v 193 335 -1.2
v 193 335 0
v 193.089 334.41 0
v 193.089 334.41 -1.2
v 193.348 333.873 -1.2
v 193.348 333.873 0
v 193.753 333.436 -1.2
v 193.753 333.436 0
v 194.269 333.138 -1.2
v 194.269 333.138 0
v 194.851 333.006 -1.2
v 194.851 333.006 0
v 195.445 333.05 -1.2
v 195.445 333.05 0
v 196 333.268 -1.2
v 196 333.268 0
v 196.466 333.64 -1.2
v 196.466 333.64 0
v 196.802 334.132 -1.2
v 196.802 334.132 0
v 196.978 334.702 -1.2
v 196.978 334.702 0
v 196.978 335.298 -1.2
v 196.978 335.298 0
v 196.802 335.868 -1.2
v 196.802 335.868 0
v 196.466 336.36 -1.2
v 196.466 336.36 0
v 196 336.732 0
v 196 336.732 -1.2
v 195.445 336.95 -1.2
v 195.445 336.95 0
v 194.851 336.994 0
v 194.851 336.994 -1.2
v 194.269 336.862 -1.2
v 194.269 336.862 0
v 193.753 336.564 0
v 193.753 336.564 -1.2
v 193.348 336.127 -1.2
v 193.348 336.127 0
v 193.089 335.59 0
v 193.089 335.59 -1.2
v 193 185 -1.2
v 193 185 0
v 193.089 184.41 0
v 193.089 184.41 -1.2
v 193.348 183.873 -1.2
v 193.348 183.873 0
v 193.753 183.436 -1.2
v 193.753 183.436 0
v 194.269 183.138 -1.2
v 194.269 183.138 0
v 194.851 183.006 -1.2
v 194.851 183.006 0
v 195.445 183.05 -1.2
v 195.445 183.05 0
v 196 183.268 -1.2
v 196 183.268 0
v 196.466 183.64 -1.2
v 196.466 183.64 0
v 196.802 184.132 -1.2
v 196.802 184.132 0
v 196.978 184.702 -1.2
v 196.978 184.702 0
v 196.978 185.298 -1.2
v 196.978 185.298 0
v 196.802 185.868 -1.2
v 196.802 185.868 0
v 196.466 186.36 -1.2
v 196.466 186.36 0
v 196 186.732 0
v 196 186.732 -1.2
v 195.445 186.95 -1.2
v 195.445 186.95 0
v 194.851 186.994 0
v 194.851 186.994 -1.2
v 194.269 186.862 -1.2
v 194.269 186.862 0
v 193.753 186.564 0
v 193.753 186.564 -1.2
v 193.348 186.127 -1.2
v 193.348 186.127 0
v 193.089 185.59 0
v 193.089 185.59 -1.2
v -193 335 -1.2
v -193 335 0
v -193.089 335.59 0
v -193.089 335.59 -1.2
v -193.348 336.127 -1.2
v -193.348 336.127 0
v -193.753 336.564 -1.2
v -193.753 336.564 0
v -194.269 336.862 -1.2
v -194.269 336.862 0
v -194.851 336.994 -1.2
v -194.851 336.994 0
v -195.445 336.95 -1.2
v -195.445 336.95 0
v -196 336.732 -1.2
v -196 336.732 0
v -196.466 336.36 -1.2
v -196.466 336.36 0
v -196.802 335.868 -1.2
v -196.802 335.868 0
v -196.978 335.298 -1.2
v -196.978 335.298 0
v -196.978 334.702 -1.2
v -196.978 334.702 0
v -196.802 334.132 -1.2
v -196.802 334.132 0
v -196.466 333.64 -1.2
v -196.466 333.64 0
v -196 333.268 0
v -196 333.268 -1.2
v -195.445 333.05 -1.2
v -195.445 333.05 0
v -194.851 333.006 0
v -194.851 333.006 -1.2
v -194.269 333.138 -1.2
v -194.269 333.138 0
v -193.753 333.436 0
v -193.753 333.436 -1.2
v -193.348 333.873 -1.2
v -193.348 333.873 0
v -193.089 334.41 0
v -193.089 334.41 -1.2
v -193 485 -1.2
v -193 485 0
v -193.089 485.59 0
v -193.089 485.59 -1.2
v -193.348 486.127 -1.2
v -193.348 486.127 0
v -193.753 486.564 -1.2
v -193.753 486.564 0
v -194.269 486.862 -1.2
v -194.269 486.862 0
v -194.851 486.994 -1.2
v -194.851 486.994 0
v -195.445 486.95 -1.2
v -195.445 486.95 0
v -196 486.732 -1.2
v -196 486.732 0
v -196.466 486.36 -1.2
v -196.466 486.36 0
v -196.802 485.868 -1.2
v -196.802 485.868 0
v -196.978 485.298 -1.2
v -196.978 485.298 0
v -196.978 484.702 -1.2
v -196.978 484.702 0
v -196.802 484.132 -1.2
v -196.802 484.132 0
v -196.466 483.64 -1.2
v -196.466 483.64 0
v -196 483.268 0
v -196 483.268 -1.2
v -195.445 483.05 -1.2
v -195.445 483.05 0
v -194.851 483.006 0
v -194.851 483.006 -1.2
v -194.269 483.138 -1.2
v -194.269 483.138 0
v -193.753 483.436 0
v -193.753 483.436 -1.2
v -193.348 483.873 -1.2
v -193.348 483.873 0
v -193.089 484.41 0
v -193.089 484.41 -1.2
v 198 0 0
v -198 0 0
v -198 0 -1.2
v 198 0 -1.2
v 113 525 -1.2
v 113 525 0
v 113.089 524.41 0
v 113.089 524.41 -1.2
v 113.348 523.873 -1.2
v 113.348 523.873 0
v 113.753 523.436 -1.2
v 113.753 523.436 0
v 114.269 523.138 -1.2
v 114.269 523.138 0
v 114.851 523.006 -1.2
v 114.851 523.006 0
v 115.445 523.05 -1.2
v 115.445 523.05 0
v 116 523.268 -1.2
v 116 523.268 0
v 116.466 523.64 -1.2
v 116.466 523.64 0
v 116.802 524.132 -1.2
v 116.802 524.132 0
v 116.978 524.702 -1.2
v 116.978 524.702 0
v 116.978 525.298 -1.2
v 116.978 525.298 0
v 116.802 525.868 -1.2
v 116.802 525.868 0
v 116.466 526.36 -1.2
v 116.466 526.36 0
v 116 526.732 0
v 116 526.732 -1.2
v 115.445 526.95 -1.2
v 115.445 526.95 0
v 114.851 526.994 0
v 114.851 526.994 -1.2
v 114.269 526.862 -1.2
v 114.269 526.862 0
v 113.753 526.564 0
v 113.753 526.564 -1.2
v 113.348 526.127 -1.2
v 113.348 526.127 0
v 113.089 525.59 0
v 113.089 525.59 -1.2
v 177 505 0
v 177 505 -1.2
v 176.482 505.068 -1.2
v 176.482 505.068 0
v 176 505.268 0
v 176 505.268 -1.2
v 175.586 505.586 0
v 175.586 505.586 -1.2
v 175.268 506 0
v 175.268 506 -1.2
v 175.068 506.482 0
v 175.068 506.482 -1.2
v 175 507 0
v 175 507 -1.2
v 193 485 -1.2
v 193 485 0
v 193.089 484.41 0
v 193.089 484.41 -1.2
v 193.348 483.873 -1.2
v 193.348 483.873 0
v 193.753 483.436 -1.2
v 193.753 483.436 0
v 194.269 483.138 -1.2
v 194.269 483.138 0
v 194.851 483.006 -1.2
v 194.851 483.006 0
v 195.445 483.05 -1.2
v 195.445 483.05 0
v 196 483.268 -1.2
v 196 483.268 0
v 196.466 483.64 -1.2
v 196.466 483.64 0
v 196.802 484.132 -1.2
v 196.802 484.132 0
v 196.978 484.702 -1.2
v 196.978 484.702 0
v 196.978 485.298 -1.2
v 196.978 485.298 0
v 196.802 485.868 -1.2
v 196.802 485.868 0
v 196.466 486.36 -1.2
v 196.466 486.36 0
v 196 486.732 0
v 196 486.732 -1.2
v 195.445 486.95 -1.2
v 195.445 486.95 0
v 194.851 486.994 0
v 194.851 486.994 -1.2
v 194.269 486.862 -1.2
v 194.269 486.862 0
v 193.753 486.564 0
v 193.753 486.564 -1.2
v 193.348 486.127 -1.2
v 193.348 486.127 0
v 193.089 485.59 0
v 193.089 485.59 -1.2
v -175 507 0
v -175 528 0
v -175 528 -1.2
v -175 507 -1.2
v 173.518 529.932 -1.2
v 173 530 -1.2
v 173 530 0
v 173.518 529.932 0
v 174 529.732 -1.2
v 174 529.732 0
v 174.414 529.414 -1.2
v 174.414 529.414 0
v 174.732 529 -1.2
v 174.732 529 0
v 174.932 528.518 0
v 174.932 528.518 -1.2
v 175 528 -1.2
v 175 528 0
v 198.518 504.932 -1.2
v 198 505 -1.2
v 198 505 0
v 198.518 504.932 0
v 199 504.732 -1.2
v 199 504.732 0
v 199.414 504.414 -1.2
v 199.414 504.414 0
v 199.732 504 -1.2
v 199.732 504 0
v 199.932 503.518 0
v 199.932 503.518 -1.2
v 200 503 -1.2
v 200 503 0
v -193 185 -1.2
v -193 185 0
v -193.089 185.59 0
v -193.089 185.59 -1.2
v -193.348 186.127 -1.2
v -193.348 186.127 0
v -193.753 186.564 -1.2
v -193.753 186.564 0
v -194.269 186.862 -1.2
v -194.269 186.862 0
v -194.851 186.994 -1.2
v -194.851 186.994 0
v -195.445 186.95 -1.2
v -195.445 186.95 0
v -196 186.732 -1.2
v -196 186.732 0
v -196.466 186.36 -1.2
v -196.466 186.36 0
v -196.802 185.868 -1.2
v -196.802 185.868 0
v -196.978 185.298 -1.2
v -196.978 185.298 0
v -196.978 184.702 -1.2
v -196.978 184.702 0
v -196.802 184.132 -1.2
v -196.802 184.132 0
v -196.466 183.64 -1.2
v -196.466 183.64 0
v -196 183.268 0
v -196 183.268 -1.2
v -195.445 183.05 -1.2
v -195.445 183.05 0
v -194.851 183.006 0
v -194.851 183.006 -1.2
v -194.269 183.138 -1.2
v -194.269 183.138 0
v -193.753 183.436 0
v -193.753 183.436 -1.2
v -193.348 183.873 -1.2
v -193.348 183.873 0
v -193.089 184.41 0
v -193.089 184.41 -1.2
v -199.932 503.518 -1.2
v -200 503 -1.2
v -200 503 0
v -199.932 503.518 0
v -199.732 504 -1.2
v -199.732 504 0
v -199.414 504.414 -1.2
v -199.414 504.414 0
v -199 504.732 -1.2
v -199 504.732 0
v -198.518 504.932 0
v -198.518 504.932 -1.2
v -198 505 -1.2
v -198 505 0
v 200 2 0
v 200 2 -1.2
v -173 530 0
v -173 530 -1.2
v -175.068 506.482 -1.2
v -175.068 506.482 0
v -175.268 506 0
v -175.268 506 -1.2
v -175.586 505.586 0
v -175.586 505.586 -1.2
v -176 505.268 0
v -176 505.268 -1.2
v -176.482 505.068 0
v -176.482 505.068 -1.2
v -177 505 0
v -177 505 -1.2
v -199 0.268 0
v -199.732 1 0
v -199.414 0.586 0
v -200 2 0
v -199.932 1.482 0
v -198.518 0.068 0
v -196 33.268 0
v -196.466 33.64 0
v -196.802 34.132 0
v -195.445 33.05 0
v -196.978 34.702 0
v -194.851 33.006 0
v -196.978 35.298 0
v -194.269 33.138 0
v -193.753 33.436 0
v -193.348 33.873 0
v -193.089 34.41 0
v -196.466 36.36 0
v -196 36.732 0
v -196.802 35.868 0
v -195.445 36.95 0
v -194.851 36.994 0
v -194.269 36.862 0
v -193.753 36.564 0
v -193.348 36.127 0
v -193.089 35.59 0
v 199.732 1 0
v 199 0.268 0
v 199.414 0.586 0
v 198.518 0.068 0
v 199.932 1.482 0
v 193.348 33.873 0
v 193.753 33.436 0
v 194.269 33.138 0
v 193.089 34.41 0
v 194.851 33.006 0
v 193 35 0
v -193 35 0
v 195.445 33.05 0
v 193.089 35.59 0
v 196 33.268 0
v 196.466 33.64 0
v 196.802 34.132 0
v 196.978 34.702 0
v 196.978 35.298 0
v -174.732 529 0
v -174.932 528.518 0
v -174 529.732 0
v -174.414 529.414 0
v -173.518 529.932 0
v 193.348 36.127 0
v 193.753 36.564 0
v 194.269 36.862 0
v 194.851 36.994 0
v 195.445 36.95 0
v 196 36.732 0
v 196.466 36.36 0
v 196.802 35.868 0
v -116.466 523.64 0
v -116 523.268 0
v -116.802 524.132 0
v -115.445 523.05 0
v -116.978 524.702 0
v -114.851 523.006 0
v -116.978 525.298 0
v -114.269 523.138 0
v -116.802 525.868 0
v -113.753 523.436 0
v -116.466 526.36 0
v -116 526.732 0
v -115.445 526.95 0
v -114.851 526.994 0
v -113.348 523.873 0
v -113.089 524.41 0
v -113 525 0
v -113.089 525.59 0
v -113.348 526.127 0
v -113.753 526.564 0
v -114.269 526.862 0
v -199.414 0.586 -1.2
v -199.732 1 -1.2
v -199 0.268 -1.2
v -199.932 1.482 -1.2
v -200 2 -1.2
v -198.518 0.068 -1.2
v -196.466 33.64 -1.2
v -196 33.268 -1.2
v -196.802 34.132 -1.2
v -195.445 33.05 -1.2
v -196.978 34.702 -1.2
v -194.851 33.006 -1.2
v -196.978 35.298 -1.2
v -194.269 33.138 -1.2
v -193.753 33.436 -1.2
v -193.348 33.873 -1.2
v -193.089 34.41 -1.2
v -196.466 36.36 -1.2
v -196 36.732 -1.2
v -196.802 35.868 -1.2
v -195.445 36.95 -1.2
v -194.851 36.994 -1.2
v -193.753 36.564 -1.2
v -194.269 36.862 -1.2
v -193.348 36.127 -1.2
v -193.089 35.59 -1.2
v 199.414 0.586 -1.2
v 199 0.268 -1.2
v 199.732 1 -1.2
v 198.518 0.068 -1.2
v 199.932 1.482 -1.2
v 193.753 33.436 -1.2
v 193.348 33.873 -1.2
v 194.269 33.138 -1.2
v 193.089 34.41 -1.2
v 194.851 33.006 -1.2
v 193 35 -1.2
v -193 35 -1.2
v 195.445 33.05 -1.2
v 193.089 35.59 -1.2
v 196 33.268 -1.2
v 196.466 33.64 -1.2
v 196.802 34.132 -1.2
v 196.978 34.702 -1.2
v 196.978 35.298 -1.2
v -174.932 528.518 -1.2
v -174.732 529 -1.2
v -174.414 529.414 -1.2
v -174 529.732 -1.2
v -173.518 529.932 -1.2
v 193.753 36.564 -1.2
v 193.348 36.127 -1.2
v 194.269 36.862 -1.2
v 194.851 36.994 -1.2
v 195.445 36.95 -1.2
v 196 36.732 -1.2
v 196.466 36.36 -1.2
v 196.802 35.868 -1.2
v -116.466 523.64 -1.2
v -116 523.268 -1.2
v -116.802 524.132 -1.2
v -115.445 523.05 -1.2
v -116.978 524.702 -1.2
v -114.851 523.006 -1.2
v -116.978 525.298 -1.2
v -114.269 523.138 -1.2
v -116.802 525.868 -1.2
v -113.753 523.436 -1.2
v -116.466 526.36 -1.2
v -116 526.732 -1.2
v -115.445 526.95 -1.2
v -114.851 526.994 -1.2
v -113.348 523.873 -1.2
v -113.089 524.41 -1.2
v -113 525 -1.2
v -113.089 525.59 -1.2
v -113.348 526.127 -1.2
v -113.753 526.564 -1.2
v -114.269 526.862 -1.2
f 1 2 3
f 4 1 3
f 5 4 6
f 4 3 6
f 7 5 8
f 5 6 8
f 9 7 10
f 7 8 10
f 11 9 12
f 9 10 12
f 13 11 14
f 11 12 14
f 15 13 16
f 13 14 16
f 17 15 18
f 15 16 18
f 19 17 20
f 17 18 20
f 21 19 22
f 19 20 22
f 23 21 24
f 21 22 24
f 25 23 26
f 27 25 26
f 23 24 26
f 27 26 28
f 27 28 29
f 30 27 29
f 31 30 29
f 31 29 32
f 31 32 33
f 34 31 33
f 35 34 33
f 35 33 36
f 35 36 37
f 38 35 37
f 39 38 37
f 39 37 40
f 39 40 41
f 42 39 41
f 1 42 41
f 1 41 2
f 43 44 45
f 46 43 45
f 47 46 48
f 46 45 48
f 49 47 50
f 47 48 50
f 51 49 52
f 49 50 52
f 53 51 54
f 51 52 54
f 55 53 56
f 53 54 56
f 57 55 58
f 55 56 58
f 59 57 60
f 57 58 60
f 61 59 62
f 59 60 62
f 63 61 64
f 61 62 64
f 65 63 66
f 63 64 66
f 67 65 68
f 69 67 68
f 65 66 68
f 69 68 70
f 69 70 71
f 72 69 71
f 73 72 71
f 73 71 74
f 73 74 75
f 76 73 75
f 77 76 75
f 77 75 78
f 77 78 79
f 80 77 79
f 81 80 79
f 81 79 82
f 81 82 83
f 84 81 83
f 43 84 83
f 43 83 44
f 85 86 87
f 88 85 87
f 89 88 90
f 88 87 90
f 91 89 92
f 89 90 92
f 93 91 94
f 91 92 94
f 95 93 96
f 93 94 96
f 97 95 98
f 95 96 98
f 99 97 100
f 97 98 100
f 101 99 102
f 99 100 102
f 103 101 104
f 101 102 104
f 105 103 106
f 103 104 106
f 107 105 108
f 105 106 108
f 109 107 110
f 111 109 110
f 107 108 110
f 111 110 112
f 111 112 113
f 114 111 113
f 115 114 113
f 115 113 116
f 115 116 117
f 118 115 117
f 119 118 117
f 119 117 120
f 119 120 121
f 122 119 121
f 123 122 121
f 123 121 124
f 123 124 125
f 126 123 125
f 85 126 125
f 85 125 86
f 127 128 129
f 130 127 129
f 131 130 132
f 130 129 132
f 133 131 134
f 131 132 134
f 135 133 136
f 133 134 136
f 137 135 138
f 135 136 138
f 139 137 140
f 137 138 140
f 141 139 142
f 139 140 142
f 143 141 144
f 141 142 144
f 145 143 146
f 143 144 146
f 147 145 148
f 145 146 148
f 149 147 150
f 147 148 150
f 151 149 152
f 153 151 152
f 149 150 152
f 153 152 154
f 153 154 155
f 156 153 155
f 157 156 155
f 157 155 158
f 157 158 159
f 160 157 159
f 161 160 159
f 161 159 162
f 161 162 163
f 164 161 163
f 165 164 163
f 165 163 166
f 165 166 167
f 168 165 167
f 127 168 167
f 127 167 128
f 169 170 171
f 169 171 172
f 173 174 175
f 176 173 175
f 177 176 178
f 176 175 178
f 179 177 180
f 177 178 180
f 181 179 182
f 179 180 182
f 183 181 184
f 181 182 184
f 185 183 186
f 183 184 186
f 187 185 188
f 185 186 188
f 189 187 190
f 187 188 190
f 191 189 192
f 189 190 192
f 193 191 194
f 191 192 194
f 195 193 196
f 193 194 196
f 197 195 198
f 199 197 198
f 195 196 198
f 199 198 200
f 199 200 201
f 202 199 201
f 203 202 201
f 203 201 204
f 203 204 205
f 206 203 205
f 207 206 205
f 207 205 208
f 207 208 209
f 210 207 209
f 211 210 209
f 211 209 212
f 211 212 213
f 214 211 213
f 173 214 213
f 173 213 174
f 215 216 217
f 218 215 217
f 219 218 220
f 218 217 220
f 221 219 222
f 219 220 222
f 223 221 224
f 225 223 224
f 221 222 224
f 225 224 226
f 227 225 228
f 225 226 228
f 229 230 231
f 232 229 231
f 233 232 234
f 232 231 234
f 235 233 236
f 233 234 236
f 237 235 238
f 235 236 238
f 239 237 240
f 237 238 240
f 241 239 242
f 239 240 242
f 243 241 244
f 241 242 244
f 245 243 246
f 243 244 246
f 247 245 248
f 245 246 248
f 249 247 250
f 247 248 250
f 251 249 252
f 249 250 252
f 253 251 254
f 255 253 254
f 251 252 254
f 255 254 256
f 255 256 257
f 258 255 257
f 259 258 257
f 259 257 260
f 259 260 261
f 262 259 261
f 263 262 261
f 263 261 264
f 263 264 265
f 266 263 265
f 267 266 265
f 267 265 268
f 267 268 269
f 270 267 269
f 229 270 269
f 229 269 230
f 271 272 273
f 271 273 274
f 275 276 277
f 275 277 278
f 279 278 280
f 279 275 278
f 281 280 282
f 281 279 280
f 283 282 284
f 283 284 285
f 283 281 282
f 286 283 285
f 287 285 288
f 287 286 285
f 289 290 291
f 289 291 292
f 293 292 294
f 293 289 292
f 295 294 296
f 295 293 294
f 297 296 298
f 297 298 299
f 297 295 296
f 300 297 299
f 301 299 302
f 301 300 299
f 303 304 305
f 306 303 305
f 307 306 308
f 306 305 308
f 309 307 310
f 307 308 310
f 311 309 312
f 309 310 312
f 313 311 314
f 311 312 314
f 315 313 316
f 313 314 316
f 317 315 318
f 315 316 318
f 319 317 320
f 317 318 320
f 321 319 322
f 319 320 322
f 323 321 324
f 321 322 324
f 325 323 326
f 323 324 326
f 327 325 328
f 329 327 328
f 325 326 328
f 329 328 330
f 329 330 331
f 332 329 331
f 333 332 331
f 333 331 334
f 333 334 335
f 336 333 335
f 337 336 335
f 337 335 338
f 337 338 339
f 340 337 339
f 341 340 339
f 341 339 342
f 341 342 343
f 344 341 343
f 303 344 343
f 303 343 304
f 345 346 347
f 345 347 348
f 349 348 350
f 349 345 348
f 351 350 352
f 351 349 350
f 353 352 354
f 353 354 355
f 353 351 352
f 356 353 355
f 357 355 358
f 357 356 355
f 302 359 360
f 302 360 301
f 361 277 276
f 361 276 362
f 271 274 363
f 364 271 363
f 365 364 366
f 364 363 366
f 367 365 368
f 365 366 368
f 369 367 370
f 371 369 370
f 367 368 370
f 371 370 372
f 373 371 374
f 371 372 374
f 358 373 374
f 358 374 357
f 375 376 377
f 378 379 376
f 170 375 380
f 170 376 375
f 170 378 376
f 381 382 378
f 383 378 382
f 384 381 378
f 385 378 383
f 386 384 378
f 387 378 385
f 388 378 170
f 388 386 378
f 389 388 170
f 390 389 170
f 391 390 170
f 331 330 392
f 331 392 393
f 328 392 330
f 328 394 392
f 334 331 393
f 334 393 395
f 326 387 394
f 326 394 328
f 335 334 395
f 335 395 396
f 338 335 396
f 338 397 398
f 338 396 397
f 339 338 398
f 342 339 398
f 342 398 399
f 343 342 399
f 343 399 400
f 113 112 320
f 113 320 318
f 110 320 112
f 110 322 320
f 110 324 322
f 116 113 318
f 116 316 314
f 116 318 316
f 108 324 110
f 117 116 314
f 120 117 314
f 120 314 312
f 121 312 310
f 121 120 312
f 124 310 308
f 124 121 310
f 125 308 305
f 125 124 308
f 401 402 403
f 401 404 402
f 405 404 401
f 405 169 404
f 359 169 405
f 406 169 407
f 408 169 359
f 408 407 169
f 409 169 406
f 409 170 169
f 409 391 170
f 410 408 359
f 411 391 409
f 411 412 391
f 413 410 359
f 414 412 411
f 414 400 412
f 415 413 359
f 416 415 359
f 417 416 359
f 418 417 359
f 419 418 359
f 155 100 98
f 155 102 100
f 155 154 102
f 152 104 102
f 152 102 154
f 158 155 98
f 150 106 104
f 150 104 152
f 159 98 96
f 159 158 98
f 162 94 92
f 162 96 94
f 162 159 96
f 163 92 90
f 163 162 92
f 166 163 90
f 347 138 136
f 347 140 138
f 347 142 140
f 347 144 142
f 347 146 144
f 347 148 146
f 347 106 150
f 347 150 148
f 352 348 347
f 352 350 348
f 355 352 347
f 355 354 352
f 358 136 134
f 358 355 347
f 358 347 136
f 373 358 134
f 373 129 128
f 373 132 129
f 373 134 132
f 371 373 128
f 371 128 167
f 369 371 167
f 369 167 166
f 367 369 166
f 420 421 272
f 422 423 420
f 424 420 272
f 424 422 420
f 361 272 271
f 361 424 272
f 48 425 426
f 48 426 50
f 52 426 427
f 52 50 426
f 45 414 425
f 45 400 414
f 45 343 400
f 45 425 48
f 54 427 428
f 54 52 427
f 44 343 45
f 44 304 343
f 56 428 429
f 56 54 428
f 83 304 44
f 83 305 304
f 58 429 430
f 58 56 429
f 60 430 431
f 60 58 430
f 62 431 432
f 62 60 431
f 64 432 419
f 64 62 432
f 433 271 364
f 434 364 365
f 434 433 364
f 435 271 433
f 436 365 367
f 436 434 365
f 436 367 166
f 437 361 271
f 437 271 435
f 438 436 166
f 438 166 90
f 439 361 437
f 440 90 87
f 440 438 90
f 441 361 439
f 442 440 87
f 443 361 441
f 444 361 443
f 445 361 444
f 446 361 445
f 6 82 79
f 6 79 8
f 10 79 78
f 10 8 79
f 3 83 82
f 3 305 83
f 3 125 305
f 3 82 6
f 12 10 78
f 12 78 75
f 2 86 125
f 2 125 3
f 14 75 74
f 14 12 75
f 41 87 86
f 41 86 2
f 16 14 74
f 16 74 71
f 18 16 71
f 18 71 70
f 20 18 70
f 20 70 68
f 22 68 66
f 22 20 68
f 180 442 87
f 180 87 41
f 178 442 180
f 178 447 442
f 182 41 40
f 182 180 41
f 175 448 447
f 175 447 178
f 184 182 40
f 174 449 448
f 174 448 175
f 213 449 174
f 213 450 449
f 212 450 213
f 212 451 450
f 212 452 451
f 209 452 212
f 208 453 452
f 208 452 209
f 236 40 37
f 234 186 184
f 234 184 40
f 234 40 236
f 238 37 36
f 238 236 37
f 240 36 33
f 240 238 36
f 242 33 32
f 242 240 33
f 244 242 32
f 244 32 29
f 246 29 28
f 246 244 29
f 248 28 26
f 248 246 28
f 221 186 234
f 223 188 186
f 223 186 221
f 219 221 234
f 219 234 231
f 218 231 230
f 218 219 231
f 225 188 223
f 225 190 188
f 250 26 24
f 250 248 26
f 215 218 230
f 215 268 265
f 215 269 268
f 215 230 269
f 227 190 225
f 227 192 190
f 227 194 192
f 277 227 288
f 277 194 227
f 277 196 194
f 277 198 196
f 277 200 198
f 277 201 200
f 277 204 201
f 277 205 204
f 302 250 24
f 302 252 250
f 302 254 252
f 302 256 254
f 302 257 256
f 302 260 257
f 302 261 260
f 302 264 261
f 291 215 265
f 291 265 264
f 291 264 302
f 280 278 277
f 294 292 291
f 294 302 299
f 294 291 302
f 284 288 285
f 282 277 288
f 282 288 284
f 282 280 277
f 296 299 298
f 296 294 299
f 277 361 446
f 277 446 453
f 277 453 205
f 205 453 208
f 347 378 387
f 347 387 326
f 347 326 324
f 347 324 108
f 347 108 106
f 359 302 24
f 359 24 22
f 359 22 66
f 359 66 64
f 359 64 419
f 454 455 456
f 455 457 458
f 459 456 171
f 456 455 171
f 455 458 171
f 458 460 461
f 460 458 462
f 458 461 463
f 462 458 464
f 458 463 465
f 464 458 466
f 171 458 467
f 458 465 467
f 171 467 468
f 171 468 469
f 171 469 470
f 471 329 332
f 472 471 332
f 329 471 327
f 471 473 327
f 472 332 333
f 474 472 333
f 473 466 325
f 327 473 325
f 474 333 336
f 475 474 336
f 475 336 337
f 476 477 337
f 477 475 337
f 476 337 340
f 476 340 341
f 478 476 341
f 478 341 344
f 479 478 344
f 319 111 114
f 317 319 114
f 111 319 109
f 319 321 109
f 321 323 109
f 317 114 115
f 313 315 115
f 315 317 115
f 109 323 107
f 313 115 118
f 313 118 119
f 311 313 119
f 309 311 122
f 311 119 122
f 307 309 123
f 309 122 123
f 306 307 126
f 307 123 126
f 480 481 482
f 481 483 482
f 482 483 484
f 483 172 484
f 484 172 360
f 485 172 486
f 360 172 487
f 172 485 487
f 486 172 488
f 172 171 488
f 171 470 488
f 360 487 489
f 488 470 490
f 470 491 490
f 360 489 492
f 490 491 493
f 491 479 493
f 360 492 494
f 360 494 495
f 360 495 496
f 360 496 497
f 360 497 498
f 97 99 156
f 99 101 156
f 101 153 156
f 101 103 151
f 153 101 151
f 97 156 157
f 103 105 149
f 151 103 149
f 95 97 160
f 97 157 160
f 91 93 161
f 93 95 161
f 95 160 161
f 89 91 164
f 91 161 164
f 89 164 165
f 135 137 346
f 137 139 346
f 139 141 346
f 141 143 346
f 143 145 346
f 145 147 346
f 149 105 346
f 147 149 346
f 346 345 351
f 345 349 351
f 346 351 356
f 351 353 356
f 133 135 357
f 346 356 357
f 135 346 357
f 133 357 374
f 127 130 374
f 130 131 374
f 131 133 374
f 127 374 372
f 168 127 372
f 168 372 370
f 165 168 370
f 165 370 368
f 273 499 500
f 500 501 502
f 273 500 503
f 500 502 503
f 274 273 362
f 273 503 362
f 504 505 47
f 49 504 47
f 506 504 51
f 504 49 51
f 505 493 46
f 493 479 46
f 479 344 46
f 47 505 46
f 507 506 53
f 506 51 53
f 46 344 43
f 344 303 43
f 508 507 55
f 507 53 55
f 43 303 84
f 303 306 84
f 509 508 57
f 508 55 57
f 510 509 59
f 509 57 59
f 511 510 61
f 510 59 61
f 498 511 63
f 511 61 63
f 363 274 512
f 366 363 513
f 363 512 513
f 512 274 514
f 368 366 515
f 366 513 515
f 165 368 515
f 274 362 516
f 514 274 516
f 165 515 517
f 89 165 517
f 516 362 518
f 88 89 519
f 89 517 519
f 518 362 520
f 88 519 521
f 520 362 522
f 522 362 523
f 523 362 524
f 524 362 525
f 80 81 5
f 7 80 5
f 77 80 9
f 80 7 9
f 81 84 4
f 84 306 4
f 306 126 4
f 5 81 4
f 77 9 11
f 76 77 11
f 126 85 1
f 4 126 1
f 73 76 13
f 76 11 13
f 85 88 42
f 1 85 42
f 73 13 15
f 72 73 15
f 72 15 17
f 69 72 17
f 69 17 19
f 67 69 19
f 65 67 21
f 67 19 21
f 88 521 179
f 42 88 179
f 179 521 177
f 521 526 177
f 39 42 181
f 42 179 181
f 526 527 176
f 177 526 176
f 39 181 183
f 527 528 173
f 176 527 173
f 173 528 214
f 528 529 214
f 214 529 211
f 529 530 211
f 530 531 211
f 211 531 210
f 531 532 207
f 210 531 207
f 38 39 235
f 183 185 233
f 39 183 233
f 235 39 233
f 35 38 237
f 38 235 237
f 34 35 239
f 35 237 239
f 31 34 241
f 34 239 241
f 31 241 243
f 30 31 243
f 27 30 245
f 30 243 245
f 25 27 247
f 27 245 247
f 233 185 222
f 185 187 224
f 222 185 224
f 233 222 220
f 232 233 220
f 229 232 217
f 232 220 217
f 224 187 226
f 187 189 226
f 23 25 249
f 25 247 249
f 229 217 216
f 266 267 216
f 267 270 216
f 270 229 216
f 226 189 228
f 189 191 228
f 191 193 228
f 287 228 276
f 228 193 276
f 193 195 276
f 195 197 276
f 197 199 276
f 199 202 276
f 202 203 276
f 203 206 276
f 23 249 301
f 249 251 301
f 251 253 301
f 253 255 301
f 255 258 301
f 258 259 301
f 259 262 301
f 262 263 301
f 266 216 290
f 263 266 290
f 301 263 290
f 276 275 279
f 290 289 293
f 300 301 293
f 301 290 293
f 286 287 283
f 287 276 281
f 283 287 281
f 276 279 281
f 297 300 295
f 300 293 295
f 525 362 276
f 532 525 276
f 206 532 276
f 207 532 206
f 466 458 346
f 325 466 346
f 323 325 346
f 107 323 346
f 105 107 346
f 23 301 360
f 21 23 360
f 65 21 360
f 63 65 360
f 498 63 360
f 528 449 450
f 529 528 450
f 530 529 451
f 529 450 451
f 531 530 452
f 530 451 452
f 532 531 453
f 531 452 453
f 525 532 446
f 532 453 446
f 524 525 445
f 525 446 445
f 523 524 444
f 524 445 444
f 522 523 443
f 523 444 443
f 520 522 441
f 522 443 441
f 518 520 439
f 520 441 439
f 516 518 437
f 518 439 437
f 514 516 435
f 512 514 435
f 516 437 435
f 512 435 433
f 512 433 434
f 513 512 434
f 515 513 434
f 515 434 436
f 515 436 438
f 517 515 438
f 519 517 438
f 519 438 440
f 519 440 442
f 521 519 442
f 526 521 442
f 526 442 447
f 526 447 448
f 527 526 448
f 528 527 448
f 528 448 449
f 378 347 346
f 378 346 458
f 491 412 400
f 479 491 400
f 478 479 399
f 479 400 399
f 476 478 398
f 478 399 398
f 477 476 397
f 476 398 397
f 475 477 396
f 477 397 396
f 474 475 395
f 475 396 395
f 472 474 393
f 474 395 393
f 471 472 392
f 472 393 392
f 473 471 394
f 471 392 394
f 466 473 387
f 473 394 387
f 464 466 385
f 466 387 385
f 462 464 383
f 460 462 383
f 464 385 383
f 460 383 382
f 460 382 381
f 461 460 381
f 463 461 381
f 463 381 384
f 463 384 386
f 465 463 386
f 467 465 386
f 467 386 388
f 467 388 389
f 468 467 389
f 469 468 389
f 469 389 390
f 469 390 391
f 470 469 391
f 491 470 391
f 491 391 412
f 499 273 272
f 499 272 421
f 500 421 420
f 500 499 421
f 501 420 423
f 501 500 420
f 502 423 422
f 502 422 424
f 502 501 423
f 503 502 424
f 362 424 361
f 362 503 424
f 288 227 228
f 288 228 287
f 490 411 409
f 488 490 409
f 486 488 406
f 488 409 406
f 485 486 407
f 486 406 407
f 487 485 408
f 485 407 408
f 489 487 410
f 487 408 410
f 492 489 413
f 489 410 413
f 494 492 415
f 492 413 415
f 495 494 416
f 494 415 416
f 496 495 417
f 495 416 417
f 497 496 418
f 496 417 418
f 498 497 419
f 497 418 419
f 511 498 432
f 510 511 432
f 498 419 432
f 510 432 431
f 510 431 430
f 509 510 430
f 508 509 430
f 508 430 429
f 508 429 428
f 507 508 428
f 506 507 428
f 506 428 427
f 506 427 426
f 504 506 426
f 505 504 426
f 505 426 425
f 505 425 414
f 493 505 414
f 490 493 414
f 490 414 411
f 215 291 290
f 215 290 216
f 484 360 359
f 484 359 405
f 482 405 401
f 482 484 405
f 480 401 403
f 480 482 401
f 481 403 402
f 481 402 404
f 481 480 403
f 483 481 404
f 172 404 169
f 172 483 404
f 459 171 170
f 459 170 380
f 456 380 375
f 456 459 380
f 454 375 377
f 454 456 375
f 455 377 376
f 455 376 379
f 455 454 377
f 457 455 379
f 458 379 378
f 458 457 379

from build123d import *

# Parameters (mm, degrees)
TABAN_FLAN_1_DEPTH    = 1.2
K_ELERI_START         = -1.2
K_ELERI_K_R1_DEPTH    = 1.2
K_ELERI_K_R1_2_DEPTH  = 1.2
IZIM2_R               = 2
KES_EKSTR_ZYON1_DEPTH = 10


# Read off the part's stored shape, not the designer's step: Köşeleri kır1
# Sheet-metal steps are written as plain solids
with BuildPart() as part:
    # Çizim1 → Taban-Flanş1 (new body)
    with BuildSketch(Plane.XY):
        Polygon((-200, 0), (200, 0), (200, 505), (175, 505), (175, 530), (-175, 530), (-175, 505), (-200, 505), align=None)
    extrude(amount=-TABAN_FLAN_1_DEPTH)

    # Köşeleri kır1 outline → Köşeleri kır1 (cut)
    with BuildSketch(Plane.XY.offset(K_ELERI_START)):
        with BuildLine():
            ThreePointArc((200, 2), (199.414213562, 0.585786438), (198, 0))
            Line((198, 0), (200, 0))
            Line((200, 0), (200, 2))
        make_face()
        with BuildLine():
            Line((-200, 0), (-198, 0))
            ThreePointArc((-198, 0), (-199.414213562, 0.585786438), (-200, 2))
            Line((-200, 2), (-200, 0))
        make_face()
        with BuildLine():
            ThreePointArc((198, 505), (199.414213562, 504.414213562), (200, 503))
            Line((200, 503), (200, 505))
            Line((200, 505), (198, 505))
        make_face()
        with BuildLine():
            Line((-200, 505), (-200, 503))
            ThreePointArc((-200, 503), (-199.414213562, 504.414213562), (-198, 505))
            Line((-198, 505), (-200, 505))
        make_face()
        with BuildLine():
            ThreePointArc((173, 530), (174.414213562, 529.414213562), (175, 528))
            Line((175, 528), (175, 530))
            Line((175, 530), (173, 530))
        make_face()
        with BuildLine():
            Line((-175, 530), (-175, 528))
            ThreePointArc((-175, 528), (-174.414213562, 529.414213562), (-173, 530))
            Line((-173, 530), (-175, 530))
        make_face()
    extrude(amount=K_ELERI_K_R1_DEPTH, mode=Mode.SUBTRACT)

    # K_eleri k_r1 2 outline → K_eleri k_r1 2 (add)
    with BuildSketch(Plane.XY.offset(K_ELERI_START)):
        with BuildLine():
            Line((175, 505), (177, 505))
            ThreePointArc((177, 505), (175.585786438, 505.585786438), (175, 507))
            Line((175, 507), (175, 505))
        make_face()
        with BuildLine():
            ThreePointArc((-175, 507), (-175.585786438, 505.585786438), (-177, 505))
            Line((-177, 505), (-175, 505))
            Line((-175, 505), (-175, 507))
        make_face()
    extrude(amount=K_ELERI_K_R1_2_DEPTH)

    # Çizim2 → Kes-Ekstrüzyon1 (cut)
    with BuildSketch(Plane.XY):
        with Locations((-195, 485)):
            Circle(IZIM2_R)
        with Locations((-195, 335)):
            Circle(IZIM2_R)
        with Locations((-195, 185)):
            Circle(IZIM2_R)
        with Locations((-195, 35)):
            Circle(IZIM2_R)
        with Locations((-115, 525)):
            Circle(IZIM2_R)
        with Locations(Location((115, 525, 0), (0, 0, 180))):
            Circle(IZIM2_R)
        with Locations(Location((195, 35, 0), (0, 0, 180))):
            Circle(IZIM2_R)
        with Locations(Location((195, 185, 0), (0, 0, 180))):
            Circle(IZIM2_R)
        with Locations(Location((195, 335, 0), (0, 0, 180))):
            Circle(IZIM2_R)
        with Locations(Location((195, 485, 0), (0, 0, 180))):
            Circle(IZIM2_R)
    extrude(amount=-KES_EKSTR_ZYON1_DEPTH, mode=Mode.SUBTRACT)


solid = part.part
